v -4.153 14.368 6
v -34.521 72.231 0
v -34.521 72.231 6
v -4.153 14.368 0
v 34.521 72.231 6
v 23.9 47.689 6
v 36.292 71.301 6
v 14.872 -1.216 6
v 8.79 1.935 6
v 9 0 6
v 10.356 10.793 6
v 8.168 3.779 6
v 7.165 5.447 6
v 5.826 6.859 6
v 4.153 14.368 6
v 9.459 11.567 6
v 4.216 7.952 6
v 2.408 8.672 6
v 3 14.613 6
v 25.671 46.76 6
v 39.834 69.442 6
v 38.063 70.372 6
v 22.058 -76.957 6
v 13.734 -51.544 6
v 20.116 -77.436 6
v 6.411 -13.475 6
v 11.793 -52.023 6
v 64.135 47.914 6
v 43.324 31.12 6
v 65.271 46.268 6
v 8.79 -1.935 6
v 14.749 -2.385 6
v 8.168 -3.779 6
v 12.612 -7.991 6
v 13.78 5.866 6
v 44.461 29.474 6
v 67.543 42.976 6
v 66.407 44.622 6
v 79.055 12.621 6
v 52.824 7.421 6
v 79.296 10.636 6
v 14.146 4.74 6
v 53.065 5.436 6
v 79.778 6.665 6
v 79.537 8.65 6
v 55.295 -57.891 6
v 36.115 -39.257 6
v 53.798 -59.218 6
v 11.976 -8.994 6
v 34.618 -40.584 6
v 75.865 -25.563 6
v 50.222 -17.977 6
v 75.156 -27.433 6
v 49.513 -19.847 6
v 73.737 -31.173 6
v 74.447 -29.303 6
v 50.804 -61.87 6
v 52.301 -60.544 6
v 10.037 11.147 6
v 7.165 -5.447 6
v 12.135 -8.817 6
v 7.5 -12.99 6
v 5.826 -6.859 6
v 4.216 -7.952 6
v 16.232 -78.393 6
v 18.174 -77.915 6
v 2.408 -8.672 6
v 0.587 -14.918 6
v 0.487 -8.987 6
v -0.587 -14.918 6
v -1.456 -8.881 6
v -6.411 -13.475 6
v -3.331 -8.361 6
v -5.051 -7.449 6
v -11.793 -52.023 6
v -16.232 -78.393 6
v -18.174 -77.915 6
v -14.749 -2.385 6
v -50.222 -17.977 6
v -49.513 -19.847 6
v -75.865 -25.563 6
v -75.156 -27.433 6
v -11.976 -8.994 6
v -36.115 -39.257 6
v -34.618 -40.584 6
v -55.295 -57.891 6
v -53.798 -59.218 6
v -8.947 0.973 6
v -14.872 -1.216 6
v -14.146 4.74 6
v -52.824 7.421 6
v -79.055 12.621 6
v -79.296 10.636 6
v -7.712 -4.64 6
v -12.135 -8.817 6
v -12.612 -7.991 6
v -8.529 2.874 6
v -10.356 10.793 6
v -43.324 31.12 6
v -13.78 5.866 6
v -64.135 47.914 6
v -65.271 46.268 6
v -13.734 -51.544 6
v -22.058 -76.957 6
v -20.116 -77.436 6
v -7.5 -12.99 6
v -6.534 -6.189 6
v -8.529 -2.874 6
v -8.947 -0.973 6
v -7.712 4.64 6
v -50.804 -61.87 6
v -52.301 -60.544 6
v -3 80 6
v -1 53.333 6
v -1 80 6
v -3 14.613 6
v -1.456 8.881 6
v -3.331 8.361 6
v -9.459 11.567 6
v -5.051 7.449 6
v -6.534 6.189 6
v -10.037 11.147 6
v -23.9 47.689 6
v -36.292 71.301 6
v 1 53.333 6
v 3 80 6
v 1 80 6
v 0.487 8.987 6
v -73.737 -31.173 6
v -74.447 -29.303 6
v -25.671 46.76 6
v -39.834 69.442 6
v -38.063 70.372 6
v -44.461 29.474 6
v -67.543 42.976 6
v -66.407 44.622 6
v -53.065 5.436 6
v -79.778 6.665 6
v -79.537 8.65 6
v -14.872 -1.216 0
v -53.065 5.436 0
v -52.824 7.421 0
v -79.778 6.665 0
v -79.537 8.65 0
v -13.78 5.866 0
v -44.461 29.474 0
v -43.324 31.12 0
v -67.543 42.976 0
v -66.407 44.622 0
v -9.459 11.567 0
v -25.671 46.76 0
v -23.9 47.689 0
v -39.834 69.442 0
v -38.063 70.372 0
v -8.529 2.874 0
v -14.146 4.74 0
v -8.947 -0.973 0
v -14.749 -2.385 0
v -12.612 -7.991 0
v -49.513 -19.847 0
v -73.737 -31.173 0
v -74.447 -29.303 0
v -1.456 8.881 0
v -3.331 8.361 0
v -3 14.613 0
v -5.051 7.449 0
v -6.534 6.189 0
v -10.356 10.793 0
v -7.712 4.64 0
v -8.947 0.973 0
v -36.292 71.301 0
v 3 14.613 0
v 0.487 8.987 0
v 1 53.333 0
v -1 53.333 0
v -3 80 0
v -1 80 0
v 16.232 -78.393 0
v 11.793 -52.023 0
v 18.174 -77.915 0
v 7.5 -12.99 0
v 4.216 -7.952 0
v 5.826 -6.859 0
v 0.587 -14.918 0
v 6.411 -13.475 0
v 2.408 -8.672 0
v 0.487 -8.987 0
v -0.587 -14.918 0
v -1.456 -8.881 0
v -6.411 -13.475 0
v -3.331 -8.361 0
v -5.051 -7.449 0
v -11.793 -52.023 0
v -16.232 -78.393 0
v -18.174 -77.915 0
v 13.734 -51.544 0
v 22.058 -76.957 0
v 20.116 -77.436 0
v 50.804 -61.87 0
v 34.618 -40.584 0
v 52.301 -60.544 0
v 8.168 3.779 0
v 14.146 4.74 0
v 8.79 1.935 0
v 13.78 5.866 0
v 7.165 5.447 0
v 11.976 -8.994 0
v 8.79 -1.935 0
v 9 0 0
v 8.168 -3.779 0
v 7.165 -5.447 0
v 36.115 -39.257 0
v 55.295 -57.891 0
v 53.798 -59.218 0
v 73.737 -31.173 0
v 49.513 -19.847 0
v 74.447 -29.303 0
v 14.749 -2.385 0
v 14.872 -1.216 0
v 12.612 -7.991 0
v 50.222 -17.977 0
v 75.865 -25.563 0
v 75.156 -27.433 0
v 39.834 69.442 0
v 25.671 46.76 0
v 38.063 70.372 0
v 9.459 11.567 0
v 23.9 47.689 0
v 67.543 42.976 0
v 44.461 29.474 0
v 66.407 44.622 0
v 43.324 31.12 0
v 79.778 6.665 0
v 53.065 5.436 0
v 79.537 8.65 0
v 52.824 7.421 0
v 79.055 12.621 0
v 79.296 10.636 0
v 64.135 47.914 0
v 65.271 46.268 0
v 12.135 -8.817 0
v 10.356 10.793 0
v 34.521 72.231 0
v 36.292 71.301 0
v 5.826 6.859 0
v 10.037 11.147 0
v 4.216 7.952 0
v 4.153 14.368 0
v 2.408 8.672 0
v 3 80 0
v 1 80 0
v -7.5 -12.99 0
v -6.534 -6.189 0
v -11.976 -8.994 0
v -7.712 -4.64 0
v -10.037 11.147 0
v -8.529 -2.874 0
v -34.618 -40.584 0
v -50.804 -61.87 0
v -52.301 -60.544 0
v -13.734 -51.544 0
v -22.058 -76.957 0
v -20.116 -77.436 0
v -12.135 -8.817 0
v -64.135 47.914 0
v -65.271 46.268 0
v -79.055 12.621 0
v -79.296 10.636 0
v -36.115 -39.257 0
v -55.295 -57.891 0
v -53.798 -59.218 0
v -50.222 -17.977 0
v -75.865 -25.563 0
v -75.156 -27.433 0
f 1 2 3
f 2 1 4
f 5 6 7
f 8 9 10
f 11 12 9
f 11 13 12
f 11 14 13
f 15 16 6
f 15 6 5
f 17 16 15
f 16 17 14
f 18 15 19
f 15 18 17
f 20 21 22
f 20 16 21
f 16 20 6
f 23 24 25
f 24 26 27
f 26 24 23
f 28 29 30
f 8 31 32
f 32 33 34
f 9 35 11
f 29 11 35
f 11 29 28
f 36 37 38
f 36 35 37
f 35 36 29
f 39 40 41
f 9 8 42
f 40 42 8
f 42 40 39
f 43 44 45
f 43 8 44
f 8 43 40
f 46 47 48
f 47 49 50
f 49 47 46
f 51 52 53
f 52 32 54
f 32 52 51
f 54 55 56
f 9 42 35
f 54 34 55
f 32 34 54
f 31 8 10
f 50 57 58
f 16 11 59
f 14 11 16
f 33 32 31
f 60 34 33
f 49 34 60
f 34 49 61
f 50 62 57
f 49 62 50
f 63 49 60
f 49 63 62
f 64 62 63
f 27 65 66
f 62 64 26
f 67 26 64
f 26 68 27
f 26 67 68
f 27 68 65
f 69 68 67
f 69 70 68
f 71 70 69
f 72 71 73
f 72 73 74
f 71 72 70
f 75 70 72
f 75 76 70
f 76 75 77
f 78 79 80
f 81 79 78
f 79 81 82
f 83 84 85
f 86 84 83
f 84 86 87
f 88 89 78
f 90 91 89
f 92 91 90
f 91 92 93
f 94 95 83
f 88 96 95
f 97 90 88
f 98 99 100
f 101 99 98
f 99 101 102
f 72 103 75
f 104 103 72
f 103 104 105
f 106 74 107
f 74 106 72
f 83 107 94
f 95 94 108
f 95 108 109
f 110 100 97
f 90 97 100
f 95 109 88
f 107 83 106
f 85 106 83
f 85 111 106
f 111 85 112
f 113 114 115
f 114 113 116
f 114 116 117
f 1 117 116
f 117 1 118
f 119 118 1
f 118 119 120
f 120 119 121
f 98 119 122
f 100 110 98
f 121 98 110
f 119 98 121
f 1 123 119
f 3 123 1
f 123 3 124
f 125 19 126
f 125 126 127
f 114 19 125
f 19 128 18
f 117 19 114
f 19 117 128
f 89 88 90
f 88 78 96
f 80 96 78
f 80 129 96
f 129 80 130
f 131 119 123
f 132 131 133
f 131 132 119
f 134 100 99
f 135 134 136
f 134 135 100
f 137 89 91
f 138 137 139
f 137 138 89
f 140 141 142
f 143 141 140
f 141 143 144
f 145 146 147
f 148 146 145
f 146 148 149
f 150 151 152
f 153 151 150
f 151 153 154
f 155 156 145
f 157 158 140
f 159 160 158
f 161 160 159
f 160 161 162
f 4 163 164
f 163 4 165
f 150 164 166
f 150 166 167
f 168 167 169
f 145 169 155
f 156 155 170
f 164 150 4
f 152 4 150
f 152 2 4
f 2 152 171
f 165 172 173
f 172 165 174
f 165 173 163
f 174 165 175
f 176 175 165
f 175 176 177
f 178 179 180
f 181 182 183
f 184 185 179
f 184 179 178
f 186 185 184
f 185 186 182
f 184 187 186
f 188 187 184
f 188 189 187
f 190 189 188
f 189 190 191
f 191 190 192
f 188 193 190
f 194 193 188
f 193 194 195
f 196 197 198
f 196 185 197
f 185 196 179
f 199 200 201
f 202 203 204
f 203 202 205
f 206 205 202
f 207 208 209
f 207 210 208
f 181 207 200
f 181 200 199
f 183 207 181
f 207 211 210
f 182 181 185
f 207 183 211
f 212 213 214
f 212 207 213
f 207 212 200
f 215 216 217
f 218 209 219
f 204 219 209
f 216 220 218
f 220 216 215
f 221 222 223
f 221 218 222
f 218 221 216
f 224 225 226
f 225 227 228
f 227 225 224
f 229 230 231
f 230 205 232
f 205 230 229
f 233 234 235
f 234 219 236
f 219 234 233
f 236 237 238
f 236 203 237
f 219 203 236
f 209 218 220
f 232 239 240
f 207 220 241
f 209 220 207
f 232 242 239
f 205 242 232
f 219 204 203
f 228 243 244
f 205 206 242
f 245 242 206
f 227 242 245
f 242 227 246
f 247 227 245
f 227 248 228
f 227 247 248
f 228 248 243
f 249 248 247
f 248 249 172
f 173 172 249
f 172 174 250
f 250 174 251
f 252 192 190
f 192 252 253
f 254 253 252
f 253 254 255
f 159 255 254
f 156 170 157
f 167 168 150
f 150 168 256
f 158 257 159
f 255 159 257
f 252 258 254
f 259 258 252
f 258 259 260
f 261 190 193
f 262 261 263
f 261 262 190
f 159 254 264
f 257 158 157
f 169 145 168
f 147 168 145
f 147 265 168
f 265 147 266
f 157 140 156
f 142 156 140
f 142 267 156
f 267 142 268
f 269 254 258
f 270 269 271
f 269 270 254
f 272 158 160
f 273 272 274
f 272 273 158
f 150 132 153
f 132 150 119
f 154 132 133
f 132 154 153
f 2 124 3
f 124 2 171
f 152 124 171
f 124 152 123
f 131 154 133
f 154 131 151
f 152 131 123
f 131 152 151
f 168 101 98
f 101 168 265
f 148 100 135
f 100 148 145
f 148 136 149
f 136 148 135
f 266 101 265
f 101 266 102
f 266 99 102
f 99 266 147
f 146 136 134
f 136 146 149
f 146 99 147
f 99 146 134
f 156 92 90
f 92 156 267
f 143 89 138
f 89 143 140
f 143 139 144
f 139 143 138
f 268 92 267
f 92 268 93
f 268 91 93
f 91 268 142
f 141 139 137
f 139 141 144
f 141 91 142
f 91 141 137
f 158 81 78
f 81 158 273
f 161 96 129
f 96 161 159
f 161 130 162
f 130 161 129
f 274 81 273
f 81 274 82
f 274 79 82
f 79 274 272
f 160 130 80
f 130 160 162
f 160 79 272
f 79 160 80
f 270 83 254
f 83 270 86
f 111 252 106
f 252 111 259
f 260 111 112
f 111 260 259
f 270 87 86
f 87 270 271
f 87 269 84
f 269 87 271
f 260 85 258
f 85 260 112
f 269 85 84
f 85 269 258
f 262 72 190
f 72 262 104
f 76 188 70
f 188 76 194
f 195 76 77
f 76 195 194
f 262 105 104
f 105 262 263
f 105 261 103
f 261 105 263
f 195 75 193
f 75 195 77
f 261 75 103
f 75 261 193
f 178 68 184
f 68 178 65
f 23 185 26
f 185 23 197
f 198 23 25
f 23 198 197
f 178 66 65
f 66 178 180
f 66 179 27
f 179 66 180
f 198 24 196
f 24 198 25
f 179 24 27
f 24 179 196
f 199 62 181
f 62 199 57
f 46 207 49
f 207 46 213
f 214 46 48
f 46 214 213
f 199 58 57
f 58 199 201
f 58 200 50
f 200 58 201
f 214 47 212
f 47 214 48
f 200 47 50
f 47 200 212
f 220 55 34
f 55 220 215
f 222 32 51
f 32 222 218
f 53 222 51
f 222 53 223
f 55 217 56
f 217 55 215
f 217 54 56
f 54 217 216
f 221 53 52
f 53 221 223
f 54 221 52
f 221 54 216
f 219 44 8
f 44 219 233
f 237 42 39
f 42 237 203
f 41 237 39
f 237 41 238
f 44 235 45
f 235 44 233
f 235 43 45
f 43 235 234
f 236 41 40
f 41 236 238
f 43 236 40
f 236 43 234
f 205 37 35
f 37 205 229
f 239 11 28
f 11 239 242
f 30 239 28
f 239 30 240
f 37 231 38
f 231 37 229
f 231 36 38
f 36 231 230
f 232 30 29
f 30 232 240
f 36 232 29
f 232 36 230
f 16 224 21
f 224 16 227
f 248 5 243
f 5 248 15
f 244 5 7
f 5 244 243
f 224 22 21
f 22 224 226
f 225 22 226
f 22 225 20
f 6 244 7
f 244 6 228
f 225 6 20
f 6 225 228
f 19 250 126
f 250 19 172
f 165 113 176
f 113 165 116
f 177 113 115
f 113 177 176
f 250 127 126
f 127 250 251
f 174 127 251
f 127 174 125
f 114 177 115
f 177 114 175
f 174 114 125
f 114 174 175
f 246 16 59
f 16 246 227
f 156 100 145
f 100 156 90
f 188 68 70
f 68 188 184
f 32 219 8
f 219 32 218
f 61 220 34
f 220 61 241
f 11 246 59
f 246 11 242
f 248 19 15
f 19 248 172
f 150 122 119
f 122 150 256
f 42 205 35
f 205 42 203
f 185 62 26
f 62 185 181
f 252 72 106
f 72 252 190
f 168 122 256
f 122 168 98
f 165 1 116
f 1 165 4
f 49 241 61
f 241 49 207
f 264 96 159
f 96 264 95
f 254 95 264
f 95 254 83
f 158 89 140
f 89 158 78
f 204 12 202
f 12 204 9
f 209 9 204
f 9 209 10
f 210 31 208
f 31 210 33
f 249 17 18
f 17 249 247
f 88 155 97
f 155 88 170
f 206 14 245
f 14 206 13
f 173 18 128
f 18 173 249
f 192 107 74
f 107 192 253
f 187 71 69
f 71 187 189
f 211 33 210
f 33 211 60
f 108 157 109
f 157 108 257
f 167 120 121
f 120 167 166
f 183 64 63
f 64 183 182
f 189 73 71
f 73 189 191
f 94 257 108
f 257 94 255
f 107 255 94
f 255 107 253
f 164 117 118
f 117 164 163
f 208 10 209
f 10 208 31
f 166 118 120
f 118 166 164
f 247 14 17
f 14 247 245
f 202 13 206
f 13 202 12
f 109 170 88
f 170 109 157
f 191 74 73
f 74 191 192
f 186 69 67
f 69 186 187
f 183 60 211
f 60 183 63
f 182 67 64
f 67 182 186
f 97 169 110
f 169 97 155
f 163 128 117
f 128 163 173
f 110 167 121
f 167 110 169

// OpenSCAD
//Leg count
legCount=13 ;//[2:15]
//Pie Cutter radius

pieCutterRadius = 80; //[15:80]

//Pie Cutter thickness
pieCutterthickness=6; //[2:10]

//Center  radius
centerRadius = 15; //[5:20]

main();

module main()
{
	difference()
	{
		union ()
		{
				for ( i = [1 :legCount])
				{
					rotate([0,0,i * (360/ legCount) ])
						leg(	x=pieCutterthickness,
								y=pieCutterRadius,
								z=pieCutterthickness);	
				}
				cylinder(r=centerRadius,h=pieCutterthickness);
		}
		translate([0,0,-pieCutterthickness/2]) 
				cylinder(	r=centerRadius-pieCutterthickness,
								h=2*pieCutterthickness);
	}
}

module leg(x,y,z)
{
	translate([-x/2,0,0] )
	difference()
	{ 
		cube([x,y,z]);
		translate([ x/3,2 *y/3 ,-1]) cube([x/3, y/3 +1 ,z+2]);
	}	
}

